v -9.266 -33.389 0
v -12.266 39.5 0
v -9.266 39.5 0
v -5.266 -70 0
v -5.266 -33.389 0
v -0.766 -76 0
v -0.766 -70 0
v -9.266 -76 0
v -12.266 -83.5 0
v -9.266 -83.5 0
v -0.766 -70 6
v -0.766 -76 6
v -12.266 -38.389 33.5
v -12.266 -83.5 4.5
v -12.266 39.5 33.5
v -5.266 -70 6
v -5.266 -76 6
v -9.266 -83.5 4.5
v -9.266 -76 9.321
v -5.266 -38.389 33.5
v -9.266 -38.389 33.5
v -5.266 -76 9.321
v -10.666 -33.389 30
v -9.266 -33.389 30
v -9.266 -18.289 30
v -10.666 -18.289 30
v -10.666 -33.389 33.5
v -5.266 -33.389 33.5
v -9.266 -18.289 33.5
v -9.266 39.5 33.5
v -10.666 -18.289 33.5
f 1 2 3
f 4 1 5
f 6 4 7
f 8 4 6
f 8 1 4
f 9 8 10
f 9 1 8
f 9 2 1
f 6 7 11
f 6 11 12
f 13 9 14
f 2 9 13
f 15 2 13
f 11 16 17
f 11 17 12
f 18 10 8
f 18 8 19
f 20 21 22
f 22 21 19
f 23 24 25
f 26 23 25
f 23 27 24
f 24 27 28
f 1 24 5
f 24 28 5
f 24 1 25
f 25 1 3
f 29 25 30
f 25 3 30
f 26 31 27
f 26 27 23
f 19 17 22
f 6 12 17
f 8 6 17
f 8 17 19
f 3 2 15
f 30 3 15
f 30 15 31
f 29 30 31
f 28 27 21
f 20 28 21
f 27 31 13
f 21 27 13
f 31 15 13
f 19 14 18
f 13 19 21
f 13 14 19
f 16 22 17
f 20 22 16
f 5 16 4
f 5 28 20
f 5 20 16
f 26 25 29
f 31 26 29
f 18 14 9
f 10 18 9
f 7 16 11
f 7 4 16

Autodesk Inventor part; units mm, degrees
ref_plane "YZ Plane" through (0, 0, 0) normal (1, 0, 0) x (0, 1, 0)
ref_plane "XZ Plane" through (0, 0, 0) normal (0, 1, 0) x (-1, 0, 0)
ref_plane "XY Plane" through (0, 0, 0) normal (0, 0, 1) x (1, 0, 0)
ref_plane "Work Plane4" through (-12.2663, 62.5, -3) normal (-1, 0, 0) x (0, 0, 1)
sketch "Sketch4" plane through (-12.2663, 62.5, -3) normal (-1, 0, 0) x (0, 0, 1)
  line L0 (0, -23) -> (0, -129) projected
  line L1 (0, -129) -> (3, -129) projected
  line L2 (3, -23) -> (3, -129) projected
  line L3 (0, -23) -> (3, -23) projected
  circle A0 centre (13.5, 4.5) radius 25 projected
  line L4 (7.5, -146) -> (3, -146) projected
  line L5 (3, -146) -> (3, -150) projected
  line L6 (3, -150) -> (-0.5, -150) projected
  line L7 (-0.5, -150) -> (-0.5, -164) projected
  line L8 (-0.5, -164) -> (8.5, -150) projected
  line L9 (8.5, -150) -> (7.5, -150) projected
  line L10 (7.5, -150) -> (7.5, -146) projected
  line L11 (0, -132) -> (0, -150) projected
  line L12 (0, -150) -> (3, -150) projected
  line L13 (3, -132) -> (3, -150) projected
  line L14 (3, -107) -> (3, -129) projected
  line L15 (0, -129) -> (0, -107) projected
  line L16 (7.5, -146) -> (3, -146)
  line L17 (3, -146) -> (3, -23)
  line L18 (3, -23) -> (36.5, -23)
  line L19 (8.5, -150) -> (66.1149, -60.3768)
  line L20 (7.5, -146) -> (63.7229, -58.5421)
  line L21 (36.5, -23) -> (36.5, -100.8889)
  line L22 (36.5, -98.0889) -> (33.5, -98.0889)
  line L23 (33.5, -98.0889) -> (33.5, -82.9889)
  line L24 (33.5, -82.9889) -> (36.5, -82.9889)
  line L25 (36.5, -82.9889) -> (36.5, -98.0889)
  line L26 (0, -132) -> (3, -132) projected
  point P0 (3, -62.5)
  point P1 (38.5, 4.5)
  point P2 (3, -129)
  point P3 (3, -132)
  dimension "d4" = 25
  dimension "d5" = 2
  dimension "d9" = 2.8
  dimension "d10" = 15.1
  dimension "d11" = 3
extrude "Extrusion1" add sketch "Sketch4" against normal blind 3 contours L18 L21 L24 L23 L22 L20 L4 L13 L17 L2 | L21 L22 L23 L24
sketch "Sketch10" plane through (-9.2663, 62.5, -3) normal (1, 0, 0) x (0, 0, -1)
  line L0 (-36.5, -23) -> (-36.5, -100.8889) projected
  line L1 (-36.5, -95.8889) -> (-33, -95.8889)
  line L2 (-33, -95.8889) -> (-33, -80.7889)
  line L3 (-33, -80.7889) -> (-36.5, -80.7889)
  line L4 (-36.5, -80.7889) -> (-36.5, -95.8889)
  point P0 (-3, -62.5)
  point P1 (-36.5, -80.7889)
  dimension "d20" = 3.5
  dimension "d21" = 15.1
  dimension "d22" = 5
extrude "Extrusion4" cut sketch "Sketch10" against normal blind 1.4
ref_plane "Work Plane5" through (1.7337, -83.5, -0.5885) normal (0, 0, 1) x (1, 0, 0)
ref_plane "Work Plane6" through (1.7337, -82.5, 0) normal (0, 0, 1) x (1, 0, 0)
sketch "Sketch13" plane through (1.7337, -82.5, 0) normal (0, 0, 1) x (1, 0, 0)
  circle A0 centre (-5.5, 9.5) radius 1.25 projected
  circle A1 centre (-5.5, 9.5) radius 3
  line L0 (-11, -1) -> (-11, 122) projected
  line L1 (-11, 12.5) -> (-2.5, 12.5)
  line L2 (-2.5, 12.5) -> (-2.5, 6.5)
  line L3 (-2.5, 6.5) -> (-11, 6.5)
  line L4 (-11, 6.5) -> (-11, 12.5)
  point P0 (-1.7337, 82.5)
  dimension "d28" = 6
extrude "Extrusion6" add sketch "Sketch13" along normal blind 6 contours A0 | A1 | L2 L3 A1 | A1 L1 L2 | A1 L3 L0 L1
sketch "Sketch14" plane through (-9.2663, 62.5, -3) normal (1, 0, 0) x (0, 0, -1)
  line L0 (-3, -23) -> (-36.5, -23) projected
  line L1 (-36.5, -23) -> (-36.5, -100.8889) projected
  line L2 (-36.5, -100.8889) -> (-7.5, -146) projected
  line L3 (-7.5, -146) -> (-3, -146) projected
  line L4 (-3, -146) -> (-3, -23) projected
  line L5 (-36.5, -80.7889) -> (-33, -80.7889) projected
  line L6 (-36.5, -95.8889) -> (-36.5, -80.7889) projected
  line L7 (-33, -95.8889) -> (-36.5, -95.8889) projected
  line L8 (-33, -80.7889) -> (-33, -95.8889) projected
  line L9 (-36.5, -95.8889) -> (-36.5, -100.8889) projected
  line L10 (-3, -132.5) -> (-3, -23) projected
  line L11 (-36.5, -95.8889) -> (-3, -95.8889)
  line L12 (-3, -95.8889) -> (-3, -132.5)
  line L13 (-3, -132.5) -> (-36.5, -132.5)
  line L14 (-36.5, -132.5) -> (-36.5, -95.8889)
  line L15 (-3, -138.5) -> (-3, -132.5) projected
  line L16 (-3, -132.5) -> (-9, -132.5) projected
  line L17 (-9, -138.5) -> (-9, -132.5) projected
  line L18 (-3, -138.5) -> (-9, -138.5) projected
  line L19 (-3, -138.5) -> (-9, -138.5) projected
  line L20 (-7.5, -146) -> (-36.5, -100.8889) projected
  line L21 (-9, -138.5) -> (-16.1786, -138.5)
  line L22 (-16.1786, -138.5) -> (-16.1786, -132.5)
  line L23 (-16.1786, -132.5) -> (-9, -132.5)
  line L24 (-9, -132.5) -> (-9, -138.5)
  point P0 (-3, -62.5)
  point P1 (-16.1786, -132.5)
  point P2 (-3, -95.8889)
  point P3 (-12.3214, -138.5)
extrude "Extrusion7" add sketch "Sketch14" along normal blind 4 contours L4 L13 L2 L1 L7 L11 | L17 L21 L2 L13
properties part number "right_side"
